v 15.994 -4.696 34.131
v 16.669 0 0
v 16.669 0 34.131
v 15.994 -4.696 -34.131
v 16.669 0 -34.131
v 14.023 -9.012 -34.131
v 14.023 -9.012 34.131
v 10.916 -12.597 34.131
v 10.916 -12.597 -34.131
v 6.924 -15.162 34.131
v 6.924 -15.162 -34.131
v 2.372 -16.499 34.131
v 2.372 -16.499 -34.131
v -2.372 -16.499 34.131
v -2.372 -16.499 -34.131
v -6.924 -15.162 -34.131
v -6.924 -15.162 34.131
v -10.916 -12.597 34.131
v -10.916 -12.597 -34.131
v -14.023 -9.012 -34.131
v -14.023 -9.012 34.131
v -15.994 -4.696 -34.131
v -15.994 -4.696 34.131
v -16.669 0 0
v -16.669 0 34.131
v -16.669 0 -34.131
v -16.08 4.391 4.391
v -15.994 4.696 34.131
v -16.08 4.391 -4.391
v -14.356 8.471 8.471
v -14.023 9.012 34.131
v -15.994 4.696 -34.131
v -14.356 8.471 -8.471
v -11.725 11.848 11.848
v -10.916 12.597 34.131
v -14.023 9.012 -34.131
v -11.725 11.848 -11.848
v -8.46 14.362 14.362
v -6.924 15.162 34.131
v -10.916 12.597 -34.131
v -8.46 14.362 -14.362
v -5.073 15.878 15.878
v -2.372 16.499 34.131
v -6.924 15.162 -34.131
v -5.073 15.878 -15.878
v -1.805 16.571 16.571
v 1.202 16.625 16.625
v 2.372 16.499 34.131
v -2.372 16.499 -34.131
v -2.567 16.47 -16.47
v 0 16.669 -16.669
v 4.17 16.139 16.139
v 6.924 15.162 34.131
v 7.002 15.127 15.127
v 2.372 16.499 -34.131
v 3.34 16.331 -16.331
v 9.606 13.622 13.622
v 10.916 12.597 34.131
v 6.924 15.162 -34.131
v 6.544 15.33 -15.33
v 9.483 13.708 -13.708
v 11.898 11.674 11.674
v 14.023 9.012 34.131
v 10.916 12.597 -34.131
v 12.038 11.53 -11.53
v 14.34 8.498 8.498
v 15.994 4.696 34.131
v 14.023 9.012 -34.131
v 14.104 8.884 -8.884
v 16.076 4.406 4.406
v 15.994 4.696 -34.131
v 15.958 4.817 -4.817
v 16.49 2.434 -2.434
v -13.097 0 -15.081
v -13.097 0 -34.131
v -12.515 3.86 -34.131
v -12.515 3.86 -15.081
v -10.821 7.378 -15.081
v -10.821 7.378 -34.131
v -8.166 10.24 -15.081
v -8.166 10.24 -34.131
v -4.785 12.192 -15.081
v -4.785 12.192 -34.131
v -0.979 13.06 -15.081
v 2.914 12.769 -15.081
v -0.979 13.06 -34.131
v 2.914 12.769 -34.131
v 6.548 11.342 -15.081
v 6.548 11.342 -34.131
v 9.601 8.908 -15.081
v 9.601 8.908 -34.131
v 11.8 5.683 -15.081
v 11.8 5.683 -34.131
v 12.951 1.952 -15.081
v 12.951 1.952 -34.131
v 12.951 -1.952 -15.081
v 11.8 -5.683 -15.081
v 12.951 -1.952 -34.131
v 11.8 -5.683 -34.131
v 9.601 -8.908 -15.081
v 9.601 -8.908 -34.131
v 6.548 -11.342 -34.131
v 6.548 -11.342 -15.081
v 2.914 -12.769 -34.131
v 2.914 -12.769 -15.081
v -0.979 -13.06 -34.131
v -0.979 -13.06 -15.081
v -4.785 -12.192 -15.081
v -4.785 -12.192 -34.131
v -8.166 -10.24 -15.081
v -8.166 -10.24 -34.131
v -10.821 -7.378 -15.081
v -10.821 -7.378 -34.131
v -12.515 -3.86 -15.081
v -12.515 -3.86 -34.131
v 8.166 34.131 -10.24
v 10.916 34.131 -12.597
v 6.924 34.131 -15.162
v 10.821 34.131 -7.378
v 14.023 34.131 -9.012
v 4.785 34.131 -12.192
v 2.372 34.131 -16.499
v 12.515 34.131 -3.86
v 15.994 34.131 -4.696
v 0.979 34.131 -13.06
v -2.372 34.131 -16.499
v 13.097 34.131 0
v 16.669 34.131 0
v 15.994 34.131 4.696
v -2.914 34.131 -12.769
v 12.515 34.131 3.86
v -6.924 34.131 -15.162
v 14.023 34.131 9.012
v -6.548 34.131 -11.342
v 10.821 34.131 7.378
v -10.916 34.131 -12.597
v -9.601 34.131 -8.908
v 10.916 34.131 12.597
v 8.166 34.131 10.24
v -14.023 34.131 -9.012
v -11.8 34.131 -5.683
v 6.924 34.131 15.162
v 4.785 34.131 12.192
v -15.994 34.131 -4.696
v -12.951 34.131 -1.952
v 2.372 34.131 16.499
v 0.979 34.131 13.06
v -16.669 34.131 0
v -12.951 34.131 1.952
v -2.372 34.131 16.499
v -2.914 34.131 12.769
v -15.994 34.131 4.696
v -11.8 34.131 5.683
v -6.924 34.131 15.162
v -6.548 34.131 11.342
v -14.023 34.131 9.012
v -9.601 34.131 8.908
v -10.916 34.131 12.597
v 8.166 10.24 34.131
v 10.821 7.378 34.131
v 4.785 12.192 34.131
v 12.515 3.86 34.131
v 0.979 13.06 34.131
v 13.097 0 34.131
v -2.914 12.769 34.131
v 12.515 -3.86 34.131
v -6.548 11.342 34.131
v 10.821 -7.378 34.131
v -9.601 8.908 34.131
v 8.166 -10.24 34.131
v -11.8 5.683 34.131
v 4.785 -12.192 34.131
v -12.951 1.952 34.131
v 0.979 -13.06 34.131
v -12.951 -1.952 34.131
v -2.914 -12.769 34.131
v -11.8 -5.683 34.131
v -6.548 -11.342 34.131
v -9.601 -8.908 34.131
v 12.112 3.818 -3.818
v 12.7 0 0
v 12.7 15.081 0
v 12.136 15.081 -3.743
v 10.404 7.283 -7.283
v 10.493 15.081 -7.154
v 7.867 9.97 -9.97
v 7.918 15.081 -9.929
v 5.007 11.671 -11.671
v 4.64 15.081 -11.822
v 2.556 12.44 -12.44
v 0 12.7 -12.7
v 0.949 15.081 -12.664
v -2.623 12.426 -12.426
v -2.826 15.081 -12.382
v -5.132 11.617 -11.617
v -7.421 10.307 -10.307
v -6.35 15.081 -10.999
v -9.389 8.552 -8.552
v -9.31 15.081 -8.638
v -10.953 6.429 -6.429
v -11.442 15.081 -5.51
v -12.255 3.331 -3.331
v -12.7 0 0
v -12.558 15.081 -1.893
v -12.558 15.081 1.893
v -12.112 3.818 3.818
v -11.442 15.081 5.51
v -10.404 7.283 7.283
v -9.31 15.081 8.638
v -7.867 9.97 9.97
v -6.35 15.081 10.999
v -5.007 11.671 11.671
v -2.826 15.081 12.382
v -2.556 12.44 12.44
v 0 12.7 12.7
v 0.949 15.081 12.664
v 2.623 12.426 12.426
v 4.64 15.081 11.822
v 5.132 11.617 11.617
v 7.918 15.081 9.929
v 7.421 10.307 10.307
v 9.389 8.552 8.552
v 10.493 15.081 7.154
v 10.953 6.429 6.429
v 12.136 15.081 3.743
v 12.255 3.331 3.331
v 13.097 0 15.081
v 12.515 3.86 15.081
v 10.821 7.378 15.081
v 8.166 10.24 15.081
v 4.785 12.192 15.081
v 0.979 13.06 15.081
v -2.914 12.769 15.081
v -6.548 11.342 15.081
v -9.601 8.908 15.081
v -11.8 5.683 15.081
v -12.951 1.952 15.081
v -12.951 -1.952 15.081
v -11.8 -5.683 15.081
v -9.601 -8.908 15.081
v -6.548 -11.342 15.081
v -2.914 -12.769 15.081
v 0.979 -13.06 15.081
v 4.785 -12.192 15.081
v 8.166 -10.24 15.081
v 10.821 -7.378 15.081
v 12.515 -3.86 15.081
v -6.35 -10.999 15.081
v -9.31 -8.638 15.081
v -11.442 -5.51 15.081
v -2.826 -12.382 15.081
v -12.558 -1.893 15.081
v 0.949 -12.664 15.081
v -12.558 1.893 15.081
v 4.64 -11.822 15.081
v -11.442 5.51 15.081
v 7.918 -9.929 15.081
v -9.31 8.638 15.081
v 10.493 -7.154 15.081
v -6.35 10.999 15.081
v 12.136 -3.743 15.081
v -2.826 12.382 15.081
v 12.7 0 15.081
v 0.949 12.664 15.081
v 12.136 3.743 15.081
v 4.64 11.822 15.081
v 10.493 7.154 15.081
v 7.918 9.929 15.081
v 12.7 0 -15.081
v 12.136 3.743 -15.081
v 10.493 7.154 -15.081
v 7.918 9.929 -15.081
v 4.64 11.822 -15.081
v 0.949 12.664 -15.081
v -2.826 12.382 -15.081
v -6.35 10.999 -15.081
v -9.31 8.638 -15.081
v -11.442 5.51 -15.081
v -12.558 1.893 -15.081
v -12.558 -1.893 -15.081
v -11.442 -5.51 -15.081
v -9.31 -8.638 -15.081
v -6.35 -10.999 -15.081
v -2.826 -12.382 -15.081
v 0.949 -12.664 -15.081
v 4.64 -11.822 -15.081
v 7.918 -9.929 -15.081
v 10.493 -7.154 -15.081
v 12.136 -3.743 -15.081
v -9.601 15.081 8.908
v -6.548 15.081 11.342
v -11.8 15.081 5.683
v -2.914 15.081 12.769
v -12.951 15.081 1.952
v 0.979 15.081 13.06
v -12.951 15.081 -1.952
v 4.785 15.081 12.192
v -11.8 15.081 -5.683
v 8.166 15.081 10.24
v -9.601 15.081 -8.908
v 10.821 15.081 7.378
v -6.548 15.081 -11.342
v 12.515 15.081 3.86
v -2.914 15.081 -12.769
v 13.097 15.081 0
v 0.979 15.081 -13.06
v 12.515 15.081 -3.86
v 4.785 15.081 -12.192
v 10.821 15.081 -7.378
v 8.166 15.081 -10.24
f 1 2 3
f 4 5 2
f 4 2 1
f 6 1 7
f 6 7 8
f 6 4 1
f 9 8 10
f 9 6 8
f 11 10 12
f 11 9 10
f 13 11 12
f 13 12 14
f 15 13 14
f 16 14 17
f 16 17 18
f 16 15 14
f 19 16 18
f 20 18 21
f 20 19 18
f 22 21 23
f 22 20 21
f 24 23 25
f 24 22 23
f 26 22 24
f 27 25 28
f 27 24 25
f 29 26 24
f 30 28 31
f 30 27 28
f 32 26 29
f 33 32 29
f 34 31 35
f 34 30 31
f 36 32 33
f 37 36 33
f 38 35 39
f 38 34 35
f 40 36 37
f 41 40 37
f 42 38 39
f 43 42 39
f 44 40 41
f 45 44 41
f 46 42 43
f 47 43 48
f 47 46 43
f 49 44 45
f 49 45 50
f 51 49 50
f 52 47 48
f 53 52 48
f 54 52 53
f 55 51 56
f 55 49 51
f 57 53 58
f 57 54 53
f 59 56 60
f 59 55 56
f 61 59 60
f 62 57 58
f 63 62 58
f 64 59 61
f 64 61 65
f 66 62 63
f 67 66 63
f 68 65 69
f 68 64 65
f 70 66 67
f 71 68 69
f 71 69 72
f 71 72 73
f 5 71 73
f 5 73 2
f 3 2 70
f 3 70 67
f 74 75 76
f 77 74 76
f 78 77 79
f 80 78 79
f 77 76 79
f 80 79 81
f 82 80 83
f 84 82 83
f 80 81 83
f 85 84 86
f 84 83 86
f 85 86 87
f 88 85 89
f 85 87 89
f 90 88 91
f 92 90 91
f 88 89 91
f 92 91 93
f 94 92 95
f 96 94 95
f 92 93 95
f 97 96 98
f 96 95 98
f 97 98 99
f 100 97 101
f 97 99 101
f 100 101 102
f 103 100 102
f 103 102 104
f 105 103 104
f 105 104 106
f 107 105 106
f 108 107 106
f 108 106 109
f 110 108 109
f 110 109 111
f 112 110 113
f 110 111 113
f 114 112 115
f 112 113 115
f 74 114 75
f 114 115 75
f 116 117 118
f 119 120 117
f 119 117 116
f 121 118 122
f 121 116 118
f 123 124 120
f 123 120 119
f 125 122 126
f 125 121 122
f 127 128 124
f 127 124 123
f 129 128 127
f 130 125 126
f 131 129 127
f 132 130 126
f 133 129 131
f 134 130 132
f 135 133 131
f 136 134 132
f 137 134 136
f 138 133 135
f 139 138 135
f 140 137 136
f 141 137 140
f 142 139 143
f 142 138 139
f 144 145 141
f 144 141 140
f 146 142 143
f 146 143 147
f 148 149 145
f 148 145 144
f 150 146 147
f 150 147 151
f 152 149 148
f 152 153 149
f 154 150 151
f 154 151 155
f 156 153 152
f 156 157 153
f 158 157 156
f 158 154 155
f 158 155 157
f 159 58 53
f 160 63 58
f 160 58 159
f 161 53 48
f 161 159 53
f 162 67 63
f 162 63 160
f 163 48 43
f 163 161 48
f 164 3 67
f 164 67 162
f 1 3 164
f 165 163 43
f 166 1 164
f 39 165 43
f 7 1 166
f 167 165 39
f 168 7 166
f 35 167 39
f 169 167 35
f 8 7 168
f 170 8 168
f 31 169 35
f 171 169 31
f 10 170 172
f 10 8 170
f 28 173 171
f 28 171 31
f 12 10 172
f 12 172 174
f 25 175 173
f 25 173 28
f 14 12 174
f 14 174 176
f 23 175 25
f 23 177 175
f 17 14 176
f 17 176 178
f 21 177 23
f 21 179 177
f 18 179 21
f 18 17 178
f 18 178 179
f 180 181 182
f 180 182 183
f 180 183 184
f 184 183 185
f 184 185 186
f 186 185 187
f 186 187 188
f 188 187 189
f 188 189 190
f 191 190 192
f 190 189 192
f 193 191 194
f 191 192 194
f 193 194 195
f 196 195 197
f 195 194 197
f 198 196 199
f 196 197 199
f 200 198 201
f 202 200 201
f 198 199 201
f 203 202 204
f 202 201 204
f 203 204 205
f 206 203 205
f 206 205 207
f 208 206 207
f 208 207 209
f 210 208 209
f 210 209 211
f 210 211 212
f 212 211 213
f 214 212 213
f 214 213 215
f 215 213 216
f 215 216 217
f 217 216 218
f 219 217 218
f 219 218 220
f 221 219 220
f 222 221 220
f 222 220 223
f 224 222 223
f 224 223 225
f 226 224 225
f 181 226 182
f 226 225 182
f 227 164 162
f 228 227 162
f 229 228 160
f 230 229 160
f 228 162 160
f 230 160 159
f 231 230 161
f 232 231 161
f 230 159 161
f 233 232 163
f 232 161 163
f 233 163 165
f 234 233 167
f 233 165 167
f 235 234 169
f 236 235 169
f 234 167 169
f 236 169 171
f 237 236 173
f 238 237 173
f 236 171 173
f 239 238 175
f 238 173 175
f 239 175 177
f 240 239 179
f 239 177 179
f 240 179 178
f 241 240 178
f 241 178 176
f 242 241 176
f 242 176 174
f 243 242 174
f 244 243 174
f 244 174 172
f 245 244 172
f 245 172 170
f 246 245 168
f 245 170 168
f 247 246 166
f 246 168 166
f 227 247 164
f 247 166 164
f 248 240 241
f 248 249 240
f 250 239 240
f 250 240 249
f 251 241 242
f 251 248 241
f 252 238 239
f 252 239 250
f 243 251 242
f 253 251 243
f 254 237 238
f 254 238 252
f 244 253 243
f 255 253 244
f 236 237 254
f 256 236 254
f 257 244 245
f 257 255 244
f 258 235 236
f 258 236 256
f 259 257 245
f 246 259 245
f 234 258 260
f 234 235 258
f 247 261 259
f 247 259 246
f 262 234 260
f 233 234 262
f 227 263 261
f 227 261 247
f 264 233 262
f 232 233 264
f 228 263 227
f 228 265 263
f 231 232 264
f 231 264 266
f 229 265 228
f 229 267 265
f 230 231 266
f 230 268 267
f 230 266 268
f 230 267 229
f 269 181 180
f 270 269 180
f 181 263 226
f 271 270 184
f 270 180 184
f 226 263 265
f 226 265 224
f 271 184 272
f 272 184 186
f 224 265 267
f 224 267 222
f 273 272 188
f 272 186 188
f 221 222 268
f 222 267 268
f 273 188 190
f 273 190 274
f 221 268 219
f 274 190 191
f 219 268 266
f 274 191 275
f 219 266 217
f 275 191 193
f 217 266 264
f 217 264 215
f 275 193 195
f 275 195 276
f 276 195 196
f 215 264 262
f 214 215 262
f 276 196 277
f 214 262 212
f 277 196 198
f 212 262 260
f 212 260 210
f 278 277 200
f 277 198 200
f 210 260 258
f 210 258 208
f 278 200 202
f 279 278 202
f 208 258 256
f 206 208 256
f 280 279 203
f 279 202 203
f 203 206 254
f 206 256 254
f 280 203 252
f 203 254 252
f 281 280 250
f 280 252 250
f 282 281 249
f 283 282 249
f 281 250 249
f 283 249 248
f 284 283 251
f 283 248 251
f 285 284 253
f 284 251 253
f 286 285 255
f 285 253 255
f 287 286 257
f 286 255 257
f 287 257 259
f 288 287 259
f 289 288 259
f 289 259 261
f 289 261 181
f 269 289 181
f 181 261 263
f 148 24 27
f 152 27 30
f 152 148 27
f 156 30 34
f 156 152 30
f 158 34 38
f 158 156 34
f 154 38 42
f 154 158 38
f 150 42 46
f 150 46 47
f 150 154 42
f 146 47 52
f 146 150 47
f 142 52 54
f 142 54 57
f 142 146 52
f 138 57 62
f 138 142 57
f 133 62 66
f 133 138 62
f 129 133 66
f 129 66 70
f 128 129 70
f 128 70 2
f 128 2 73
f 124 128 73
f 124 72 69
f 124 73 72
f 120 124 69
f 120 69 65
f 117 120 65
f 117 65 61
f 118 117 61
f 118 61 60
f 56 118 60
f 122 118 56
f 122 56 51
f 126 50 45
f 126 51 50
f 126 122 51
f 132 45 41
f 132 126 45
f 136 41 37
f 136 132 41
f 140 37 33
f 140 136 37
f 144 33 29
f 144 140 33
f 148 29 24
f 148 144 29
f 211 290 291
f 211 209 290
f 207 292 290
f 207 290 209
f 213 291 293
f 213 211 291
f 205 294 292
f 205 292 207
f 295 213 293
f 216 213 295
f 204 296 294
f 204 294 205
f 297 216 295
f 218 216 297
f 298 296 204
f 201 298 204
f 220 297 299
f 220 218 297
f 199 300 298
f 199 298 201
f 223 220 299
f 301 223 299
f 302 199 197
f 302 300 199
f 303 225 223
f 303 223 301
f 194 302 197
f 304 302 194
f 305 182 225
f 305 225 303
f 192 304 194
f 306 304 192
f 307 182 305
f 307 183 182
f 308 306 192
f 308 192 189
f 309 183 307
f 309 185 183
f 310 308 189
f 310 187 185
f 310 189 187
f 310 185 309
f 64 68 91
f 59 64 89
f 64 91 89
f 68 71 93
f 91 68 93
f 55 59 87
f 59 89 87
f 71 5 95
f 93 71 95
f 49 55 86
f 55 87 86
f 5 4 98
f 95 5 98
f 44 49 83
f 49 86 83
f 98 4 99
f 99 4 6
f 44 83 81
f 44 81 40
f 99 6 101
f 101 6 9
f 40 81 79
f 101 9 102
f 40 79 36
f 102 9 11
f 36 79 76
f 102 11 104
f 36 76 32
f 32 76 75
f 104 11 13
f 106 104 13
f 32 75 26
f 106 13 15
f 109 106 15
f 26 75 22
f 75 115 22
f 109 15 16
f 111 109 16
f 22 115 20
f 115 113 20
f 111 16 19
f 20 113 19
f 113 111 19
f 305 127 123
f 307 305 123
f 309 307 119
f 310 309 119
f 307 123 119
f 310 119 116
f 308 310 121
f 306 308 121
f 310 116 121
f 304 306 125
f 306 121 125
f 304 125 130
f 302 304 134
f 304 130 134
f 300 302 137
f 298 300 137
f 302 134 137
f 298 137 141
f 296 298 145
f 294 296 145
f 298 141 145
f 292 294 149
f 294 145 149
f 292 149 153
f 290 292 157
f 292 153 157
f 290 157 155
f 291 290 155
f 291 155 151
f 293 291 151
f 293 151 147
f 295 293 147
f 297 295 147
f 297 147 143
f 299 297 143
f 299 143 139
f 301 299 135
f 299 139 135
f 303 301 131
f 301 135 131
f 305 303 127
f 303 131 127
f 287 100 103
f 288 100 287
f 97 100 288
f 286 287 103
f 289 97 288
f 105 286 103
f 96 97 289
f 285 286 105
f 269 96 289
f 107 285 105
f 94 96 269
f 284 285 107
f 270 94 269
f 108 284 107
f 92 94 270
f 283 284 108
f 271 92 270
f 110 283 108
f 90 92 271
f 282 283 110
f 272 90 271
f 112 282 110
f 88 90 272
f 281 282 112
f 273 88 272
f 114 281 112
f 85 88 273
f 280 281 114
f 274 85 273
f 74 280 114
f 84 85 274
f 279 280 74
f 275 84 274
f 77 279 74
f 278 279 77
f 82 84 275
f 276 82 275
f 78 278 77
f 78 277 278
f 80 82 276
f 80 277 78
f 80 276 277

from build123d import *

# Parameters (mm, degrees)
SKETCH1_W          = 16.66875
SKETCH1_H          = 68.2625
SKETCH2_W          = 16.66875
SKETCH2_H          = 34.13125
SKETCH7_R          = 12.7
CUT_EXTRUDE1_DEPTH = 69.2625
CUT_EXTRUDE2_REACH = 52.8
SKETCH8_R          = 12.7
SKETCH9_R          = 13.096875
CUT_EXTRUDE3_DEPTH = 19.05
SKETCH10_R         = 13.096875
CUT_EXTRUDE4_DEPTH = 19.05
SKETCH11_R         = 13.096875
CUT_EXTRUDE5_DEPTH = 19.05


with BuildPart() as part:
    # Sketch1 → Revolve1 (revolve)
    with BuildSketch(Plane(origin=(0, 0, 0), x_dir=(1, 0, 0), z_dir=(0, 1, 0))):
        with Locations((8.334375, 0)):
            Rectangle(SKETCH1_W, SKETCH1_H)
    revolve(axis=Axis((0, 0, 118.243982537), (0, 0, -1)))

    # Sketch2 → Revolve2 (revolve)
    with BuildSketch(Plane.XY):
        with Locations((-8.334375, 17.065625)):
            Rectangle(SKETCH2_W, SKETCH2_H)
    revolve(axis=Axis((0, 0, 0), (0, 1, 0)))

    # Sketch7 → Cut-Extrude1 (cut, through all)
    with BuildSketch(Plane.XY.offset(34.13125)):
        Circle(SKETCH7_R)
    extrude(amount=-CUT_EXTRUDE1_DEPTH, mode=Mode.SUBTRACT)

    # Sketch8 → Cut-Extrude2 (cut, up to next)
    with BuildSketch(Plane(origin=(0, 34.13125, 0), x_dir=(1, 0, 0), z_dir=(0, 1, 0)), mode=Mode.PRIVATE) as cut_extrude2_sk1:
        Circle(SKETCH8_R)
    cut_extrude2_tool1 = extrude(cut_extrude2_sk1.sketch, amount=-CUT_EXTRUDE2_REACH, mode=Mode.PRIVATE) & part.part
    add(cut_extrude2_tool1.solids().sort_by_distance((0, 34.13125, 0))[0], mode=Mode.SUBTRACT)

    # Sketch9 → Cut-Extrude3 (cut)
    with BuildSketch(Plane.XY.offset(34.13125)):
        Circle(SKETCH9_R)
    extrude(amount=-CUT_EXTRUDE3_DEPTH, mode=Mode.SUBTRACT)

    # Sketch10 → Cut-Extrude4 (cut)
    with BuildSketch(Plane(origin=(0, 0, -34.13125), x_dir=(-1, 0, 0), z_dir=(0, 0, -1))):
        Circle(SKETCH10_R)
    extrude(amount=-CUT_EXTRUDE4_DEPTH, mode=Mode.SUBTRACT)

    # Sketch11 → Cut-Extrude5 (cut)
    with BuildSketch(Plane(origin=(0, 34.13125, 0), x_dir=(1, 0, 0), z_dir=(0, 1, 0))):
        Circle(SKETCH11_R)
    extrude(amount=-CUT_EXTRUDE5_DEPTH, mode=Mode.SUBTRACT)


solid = part.part
